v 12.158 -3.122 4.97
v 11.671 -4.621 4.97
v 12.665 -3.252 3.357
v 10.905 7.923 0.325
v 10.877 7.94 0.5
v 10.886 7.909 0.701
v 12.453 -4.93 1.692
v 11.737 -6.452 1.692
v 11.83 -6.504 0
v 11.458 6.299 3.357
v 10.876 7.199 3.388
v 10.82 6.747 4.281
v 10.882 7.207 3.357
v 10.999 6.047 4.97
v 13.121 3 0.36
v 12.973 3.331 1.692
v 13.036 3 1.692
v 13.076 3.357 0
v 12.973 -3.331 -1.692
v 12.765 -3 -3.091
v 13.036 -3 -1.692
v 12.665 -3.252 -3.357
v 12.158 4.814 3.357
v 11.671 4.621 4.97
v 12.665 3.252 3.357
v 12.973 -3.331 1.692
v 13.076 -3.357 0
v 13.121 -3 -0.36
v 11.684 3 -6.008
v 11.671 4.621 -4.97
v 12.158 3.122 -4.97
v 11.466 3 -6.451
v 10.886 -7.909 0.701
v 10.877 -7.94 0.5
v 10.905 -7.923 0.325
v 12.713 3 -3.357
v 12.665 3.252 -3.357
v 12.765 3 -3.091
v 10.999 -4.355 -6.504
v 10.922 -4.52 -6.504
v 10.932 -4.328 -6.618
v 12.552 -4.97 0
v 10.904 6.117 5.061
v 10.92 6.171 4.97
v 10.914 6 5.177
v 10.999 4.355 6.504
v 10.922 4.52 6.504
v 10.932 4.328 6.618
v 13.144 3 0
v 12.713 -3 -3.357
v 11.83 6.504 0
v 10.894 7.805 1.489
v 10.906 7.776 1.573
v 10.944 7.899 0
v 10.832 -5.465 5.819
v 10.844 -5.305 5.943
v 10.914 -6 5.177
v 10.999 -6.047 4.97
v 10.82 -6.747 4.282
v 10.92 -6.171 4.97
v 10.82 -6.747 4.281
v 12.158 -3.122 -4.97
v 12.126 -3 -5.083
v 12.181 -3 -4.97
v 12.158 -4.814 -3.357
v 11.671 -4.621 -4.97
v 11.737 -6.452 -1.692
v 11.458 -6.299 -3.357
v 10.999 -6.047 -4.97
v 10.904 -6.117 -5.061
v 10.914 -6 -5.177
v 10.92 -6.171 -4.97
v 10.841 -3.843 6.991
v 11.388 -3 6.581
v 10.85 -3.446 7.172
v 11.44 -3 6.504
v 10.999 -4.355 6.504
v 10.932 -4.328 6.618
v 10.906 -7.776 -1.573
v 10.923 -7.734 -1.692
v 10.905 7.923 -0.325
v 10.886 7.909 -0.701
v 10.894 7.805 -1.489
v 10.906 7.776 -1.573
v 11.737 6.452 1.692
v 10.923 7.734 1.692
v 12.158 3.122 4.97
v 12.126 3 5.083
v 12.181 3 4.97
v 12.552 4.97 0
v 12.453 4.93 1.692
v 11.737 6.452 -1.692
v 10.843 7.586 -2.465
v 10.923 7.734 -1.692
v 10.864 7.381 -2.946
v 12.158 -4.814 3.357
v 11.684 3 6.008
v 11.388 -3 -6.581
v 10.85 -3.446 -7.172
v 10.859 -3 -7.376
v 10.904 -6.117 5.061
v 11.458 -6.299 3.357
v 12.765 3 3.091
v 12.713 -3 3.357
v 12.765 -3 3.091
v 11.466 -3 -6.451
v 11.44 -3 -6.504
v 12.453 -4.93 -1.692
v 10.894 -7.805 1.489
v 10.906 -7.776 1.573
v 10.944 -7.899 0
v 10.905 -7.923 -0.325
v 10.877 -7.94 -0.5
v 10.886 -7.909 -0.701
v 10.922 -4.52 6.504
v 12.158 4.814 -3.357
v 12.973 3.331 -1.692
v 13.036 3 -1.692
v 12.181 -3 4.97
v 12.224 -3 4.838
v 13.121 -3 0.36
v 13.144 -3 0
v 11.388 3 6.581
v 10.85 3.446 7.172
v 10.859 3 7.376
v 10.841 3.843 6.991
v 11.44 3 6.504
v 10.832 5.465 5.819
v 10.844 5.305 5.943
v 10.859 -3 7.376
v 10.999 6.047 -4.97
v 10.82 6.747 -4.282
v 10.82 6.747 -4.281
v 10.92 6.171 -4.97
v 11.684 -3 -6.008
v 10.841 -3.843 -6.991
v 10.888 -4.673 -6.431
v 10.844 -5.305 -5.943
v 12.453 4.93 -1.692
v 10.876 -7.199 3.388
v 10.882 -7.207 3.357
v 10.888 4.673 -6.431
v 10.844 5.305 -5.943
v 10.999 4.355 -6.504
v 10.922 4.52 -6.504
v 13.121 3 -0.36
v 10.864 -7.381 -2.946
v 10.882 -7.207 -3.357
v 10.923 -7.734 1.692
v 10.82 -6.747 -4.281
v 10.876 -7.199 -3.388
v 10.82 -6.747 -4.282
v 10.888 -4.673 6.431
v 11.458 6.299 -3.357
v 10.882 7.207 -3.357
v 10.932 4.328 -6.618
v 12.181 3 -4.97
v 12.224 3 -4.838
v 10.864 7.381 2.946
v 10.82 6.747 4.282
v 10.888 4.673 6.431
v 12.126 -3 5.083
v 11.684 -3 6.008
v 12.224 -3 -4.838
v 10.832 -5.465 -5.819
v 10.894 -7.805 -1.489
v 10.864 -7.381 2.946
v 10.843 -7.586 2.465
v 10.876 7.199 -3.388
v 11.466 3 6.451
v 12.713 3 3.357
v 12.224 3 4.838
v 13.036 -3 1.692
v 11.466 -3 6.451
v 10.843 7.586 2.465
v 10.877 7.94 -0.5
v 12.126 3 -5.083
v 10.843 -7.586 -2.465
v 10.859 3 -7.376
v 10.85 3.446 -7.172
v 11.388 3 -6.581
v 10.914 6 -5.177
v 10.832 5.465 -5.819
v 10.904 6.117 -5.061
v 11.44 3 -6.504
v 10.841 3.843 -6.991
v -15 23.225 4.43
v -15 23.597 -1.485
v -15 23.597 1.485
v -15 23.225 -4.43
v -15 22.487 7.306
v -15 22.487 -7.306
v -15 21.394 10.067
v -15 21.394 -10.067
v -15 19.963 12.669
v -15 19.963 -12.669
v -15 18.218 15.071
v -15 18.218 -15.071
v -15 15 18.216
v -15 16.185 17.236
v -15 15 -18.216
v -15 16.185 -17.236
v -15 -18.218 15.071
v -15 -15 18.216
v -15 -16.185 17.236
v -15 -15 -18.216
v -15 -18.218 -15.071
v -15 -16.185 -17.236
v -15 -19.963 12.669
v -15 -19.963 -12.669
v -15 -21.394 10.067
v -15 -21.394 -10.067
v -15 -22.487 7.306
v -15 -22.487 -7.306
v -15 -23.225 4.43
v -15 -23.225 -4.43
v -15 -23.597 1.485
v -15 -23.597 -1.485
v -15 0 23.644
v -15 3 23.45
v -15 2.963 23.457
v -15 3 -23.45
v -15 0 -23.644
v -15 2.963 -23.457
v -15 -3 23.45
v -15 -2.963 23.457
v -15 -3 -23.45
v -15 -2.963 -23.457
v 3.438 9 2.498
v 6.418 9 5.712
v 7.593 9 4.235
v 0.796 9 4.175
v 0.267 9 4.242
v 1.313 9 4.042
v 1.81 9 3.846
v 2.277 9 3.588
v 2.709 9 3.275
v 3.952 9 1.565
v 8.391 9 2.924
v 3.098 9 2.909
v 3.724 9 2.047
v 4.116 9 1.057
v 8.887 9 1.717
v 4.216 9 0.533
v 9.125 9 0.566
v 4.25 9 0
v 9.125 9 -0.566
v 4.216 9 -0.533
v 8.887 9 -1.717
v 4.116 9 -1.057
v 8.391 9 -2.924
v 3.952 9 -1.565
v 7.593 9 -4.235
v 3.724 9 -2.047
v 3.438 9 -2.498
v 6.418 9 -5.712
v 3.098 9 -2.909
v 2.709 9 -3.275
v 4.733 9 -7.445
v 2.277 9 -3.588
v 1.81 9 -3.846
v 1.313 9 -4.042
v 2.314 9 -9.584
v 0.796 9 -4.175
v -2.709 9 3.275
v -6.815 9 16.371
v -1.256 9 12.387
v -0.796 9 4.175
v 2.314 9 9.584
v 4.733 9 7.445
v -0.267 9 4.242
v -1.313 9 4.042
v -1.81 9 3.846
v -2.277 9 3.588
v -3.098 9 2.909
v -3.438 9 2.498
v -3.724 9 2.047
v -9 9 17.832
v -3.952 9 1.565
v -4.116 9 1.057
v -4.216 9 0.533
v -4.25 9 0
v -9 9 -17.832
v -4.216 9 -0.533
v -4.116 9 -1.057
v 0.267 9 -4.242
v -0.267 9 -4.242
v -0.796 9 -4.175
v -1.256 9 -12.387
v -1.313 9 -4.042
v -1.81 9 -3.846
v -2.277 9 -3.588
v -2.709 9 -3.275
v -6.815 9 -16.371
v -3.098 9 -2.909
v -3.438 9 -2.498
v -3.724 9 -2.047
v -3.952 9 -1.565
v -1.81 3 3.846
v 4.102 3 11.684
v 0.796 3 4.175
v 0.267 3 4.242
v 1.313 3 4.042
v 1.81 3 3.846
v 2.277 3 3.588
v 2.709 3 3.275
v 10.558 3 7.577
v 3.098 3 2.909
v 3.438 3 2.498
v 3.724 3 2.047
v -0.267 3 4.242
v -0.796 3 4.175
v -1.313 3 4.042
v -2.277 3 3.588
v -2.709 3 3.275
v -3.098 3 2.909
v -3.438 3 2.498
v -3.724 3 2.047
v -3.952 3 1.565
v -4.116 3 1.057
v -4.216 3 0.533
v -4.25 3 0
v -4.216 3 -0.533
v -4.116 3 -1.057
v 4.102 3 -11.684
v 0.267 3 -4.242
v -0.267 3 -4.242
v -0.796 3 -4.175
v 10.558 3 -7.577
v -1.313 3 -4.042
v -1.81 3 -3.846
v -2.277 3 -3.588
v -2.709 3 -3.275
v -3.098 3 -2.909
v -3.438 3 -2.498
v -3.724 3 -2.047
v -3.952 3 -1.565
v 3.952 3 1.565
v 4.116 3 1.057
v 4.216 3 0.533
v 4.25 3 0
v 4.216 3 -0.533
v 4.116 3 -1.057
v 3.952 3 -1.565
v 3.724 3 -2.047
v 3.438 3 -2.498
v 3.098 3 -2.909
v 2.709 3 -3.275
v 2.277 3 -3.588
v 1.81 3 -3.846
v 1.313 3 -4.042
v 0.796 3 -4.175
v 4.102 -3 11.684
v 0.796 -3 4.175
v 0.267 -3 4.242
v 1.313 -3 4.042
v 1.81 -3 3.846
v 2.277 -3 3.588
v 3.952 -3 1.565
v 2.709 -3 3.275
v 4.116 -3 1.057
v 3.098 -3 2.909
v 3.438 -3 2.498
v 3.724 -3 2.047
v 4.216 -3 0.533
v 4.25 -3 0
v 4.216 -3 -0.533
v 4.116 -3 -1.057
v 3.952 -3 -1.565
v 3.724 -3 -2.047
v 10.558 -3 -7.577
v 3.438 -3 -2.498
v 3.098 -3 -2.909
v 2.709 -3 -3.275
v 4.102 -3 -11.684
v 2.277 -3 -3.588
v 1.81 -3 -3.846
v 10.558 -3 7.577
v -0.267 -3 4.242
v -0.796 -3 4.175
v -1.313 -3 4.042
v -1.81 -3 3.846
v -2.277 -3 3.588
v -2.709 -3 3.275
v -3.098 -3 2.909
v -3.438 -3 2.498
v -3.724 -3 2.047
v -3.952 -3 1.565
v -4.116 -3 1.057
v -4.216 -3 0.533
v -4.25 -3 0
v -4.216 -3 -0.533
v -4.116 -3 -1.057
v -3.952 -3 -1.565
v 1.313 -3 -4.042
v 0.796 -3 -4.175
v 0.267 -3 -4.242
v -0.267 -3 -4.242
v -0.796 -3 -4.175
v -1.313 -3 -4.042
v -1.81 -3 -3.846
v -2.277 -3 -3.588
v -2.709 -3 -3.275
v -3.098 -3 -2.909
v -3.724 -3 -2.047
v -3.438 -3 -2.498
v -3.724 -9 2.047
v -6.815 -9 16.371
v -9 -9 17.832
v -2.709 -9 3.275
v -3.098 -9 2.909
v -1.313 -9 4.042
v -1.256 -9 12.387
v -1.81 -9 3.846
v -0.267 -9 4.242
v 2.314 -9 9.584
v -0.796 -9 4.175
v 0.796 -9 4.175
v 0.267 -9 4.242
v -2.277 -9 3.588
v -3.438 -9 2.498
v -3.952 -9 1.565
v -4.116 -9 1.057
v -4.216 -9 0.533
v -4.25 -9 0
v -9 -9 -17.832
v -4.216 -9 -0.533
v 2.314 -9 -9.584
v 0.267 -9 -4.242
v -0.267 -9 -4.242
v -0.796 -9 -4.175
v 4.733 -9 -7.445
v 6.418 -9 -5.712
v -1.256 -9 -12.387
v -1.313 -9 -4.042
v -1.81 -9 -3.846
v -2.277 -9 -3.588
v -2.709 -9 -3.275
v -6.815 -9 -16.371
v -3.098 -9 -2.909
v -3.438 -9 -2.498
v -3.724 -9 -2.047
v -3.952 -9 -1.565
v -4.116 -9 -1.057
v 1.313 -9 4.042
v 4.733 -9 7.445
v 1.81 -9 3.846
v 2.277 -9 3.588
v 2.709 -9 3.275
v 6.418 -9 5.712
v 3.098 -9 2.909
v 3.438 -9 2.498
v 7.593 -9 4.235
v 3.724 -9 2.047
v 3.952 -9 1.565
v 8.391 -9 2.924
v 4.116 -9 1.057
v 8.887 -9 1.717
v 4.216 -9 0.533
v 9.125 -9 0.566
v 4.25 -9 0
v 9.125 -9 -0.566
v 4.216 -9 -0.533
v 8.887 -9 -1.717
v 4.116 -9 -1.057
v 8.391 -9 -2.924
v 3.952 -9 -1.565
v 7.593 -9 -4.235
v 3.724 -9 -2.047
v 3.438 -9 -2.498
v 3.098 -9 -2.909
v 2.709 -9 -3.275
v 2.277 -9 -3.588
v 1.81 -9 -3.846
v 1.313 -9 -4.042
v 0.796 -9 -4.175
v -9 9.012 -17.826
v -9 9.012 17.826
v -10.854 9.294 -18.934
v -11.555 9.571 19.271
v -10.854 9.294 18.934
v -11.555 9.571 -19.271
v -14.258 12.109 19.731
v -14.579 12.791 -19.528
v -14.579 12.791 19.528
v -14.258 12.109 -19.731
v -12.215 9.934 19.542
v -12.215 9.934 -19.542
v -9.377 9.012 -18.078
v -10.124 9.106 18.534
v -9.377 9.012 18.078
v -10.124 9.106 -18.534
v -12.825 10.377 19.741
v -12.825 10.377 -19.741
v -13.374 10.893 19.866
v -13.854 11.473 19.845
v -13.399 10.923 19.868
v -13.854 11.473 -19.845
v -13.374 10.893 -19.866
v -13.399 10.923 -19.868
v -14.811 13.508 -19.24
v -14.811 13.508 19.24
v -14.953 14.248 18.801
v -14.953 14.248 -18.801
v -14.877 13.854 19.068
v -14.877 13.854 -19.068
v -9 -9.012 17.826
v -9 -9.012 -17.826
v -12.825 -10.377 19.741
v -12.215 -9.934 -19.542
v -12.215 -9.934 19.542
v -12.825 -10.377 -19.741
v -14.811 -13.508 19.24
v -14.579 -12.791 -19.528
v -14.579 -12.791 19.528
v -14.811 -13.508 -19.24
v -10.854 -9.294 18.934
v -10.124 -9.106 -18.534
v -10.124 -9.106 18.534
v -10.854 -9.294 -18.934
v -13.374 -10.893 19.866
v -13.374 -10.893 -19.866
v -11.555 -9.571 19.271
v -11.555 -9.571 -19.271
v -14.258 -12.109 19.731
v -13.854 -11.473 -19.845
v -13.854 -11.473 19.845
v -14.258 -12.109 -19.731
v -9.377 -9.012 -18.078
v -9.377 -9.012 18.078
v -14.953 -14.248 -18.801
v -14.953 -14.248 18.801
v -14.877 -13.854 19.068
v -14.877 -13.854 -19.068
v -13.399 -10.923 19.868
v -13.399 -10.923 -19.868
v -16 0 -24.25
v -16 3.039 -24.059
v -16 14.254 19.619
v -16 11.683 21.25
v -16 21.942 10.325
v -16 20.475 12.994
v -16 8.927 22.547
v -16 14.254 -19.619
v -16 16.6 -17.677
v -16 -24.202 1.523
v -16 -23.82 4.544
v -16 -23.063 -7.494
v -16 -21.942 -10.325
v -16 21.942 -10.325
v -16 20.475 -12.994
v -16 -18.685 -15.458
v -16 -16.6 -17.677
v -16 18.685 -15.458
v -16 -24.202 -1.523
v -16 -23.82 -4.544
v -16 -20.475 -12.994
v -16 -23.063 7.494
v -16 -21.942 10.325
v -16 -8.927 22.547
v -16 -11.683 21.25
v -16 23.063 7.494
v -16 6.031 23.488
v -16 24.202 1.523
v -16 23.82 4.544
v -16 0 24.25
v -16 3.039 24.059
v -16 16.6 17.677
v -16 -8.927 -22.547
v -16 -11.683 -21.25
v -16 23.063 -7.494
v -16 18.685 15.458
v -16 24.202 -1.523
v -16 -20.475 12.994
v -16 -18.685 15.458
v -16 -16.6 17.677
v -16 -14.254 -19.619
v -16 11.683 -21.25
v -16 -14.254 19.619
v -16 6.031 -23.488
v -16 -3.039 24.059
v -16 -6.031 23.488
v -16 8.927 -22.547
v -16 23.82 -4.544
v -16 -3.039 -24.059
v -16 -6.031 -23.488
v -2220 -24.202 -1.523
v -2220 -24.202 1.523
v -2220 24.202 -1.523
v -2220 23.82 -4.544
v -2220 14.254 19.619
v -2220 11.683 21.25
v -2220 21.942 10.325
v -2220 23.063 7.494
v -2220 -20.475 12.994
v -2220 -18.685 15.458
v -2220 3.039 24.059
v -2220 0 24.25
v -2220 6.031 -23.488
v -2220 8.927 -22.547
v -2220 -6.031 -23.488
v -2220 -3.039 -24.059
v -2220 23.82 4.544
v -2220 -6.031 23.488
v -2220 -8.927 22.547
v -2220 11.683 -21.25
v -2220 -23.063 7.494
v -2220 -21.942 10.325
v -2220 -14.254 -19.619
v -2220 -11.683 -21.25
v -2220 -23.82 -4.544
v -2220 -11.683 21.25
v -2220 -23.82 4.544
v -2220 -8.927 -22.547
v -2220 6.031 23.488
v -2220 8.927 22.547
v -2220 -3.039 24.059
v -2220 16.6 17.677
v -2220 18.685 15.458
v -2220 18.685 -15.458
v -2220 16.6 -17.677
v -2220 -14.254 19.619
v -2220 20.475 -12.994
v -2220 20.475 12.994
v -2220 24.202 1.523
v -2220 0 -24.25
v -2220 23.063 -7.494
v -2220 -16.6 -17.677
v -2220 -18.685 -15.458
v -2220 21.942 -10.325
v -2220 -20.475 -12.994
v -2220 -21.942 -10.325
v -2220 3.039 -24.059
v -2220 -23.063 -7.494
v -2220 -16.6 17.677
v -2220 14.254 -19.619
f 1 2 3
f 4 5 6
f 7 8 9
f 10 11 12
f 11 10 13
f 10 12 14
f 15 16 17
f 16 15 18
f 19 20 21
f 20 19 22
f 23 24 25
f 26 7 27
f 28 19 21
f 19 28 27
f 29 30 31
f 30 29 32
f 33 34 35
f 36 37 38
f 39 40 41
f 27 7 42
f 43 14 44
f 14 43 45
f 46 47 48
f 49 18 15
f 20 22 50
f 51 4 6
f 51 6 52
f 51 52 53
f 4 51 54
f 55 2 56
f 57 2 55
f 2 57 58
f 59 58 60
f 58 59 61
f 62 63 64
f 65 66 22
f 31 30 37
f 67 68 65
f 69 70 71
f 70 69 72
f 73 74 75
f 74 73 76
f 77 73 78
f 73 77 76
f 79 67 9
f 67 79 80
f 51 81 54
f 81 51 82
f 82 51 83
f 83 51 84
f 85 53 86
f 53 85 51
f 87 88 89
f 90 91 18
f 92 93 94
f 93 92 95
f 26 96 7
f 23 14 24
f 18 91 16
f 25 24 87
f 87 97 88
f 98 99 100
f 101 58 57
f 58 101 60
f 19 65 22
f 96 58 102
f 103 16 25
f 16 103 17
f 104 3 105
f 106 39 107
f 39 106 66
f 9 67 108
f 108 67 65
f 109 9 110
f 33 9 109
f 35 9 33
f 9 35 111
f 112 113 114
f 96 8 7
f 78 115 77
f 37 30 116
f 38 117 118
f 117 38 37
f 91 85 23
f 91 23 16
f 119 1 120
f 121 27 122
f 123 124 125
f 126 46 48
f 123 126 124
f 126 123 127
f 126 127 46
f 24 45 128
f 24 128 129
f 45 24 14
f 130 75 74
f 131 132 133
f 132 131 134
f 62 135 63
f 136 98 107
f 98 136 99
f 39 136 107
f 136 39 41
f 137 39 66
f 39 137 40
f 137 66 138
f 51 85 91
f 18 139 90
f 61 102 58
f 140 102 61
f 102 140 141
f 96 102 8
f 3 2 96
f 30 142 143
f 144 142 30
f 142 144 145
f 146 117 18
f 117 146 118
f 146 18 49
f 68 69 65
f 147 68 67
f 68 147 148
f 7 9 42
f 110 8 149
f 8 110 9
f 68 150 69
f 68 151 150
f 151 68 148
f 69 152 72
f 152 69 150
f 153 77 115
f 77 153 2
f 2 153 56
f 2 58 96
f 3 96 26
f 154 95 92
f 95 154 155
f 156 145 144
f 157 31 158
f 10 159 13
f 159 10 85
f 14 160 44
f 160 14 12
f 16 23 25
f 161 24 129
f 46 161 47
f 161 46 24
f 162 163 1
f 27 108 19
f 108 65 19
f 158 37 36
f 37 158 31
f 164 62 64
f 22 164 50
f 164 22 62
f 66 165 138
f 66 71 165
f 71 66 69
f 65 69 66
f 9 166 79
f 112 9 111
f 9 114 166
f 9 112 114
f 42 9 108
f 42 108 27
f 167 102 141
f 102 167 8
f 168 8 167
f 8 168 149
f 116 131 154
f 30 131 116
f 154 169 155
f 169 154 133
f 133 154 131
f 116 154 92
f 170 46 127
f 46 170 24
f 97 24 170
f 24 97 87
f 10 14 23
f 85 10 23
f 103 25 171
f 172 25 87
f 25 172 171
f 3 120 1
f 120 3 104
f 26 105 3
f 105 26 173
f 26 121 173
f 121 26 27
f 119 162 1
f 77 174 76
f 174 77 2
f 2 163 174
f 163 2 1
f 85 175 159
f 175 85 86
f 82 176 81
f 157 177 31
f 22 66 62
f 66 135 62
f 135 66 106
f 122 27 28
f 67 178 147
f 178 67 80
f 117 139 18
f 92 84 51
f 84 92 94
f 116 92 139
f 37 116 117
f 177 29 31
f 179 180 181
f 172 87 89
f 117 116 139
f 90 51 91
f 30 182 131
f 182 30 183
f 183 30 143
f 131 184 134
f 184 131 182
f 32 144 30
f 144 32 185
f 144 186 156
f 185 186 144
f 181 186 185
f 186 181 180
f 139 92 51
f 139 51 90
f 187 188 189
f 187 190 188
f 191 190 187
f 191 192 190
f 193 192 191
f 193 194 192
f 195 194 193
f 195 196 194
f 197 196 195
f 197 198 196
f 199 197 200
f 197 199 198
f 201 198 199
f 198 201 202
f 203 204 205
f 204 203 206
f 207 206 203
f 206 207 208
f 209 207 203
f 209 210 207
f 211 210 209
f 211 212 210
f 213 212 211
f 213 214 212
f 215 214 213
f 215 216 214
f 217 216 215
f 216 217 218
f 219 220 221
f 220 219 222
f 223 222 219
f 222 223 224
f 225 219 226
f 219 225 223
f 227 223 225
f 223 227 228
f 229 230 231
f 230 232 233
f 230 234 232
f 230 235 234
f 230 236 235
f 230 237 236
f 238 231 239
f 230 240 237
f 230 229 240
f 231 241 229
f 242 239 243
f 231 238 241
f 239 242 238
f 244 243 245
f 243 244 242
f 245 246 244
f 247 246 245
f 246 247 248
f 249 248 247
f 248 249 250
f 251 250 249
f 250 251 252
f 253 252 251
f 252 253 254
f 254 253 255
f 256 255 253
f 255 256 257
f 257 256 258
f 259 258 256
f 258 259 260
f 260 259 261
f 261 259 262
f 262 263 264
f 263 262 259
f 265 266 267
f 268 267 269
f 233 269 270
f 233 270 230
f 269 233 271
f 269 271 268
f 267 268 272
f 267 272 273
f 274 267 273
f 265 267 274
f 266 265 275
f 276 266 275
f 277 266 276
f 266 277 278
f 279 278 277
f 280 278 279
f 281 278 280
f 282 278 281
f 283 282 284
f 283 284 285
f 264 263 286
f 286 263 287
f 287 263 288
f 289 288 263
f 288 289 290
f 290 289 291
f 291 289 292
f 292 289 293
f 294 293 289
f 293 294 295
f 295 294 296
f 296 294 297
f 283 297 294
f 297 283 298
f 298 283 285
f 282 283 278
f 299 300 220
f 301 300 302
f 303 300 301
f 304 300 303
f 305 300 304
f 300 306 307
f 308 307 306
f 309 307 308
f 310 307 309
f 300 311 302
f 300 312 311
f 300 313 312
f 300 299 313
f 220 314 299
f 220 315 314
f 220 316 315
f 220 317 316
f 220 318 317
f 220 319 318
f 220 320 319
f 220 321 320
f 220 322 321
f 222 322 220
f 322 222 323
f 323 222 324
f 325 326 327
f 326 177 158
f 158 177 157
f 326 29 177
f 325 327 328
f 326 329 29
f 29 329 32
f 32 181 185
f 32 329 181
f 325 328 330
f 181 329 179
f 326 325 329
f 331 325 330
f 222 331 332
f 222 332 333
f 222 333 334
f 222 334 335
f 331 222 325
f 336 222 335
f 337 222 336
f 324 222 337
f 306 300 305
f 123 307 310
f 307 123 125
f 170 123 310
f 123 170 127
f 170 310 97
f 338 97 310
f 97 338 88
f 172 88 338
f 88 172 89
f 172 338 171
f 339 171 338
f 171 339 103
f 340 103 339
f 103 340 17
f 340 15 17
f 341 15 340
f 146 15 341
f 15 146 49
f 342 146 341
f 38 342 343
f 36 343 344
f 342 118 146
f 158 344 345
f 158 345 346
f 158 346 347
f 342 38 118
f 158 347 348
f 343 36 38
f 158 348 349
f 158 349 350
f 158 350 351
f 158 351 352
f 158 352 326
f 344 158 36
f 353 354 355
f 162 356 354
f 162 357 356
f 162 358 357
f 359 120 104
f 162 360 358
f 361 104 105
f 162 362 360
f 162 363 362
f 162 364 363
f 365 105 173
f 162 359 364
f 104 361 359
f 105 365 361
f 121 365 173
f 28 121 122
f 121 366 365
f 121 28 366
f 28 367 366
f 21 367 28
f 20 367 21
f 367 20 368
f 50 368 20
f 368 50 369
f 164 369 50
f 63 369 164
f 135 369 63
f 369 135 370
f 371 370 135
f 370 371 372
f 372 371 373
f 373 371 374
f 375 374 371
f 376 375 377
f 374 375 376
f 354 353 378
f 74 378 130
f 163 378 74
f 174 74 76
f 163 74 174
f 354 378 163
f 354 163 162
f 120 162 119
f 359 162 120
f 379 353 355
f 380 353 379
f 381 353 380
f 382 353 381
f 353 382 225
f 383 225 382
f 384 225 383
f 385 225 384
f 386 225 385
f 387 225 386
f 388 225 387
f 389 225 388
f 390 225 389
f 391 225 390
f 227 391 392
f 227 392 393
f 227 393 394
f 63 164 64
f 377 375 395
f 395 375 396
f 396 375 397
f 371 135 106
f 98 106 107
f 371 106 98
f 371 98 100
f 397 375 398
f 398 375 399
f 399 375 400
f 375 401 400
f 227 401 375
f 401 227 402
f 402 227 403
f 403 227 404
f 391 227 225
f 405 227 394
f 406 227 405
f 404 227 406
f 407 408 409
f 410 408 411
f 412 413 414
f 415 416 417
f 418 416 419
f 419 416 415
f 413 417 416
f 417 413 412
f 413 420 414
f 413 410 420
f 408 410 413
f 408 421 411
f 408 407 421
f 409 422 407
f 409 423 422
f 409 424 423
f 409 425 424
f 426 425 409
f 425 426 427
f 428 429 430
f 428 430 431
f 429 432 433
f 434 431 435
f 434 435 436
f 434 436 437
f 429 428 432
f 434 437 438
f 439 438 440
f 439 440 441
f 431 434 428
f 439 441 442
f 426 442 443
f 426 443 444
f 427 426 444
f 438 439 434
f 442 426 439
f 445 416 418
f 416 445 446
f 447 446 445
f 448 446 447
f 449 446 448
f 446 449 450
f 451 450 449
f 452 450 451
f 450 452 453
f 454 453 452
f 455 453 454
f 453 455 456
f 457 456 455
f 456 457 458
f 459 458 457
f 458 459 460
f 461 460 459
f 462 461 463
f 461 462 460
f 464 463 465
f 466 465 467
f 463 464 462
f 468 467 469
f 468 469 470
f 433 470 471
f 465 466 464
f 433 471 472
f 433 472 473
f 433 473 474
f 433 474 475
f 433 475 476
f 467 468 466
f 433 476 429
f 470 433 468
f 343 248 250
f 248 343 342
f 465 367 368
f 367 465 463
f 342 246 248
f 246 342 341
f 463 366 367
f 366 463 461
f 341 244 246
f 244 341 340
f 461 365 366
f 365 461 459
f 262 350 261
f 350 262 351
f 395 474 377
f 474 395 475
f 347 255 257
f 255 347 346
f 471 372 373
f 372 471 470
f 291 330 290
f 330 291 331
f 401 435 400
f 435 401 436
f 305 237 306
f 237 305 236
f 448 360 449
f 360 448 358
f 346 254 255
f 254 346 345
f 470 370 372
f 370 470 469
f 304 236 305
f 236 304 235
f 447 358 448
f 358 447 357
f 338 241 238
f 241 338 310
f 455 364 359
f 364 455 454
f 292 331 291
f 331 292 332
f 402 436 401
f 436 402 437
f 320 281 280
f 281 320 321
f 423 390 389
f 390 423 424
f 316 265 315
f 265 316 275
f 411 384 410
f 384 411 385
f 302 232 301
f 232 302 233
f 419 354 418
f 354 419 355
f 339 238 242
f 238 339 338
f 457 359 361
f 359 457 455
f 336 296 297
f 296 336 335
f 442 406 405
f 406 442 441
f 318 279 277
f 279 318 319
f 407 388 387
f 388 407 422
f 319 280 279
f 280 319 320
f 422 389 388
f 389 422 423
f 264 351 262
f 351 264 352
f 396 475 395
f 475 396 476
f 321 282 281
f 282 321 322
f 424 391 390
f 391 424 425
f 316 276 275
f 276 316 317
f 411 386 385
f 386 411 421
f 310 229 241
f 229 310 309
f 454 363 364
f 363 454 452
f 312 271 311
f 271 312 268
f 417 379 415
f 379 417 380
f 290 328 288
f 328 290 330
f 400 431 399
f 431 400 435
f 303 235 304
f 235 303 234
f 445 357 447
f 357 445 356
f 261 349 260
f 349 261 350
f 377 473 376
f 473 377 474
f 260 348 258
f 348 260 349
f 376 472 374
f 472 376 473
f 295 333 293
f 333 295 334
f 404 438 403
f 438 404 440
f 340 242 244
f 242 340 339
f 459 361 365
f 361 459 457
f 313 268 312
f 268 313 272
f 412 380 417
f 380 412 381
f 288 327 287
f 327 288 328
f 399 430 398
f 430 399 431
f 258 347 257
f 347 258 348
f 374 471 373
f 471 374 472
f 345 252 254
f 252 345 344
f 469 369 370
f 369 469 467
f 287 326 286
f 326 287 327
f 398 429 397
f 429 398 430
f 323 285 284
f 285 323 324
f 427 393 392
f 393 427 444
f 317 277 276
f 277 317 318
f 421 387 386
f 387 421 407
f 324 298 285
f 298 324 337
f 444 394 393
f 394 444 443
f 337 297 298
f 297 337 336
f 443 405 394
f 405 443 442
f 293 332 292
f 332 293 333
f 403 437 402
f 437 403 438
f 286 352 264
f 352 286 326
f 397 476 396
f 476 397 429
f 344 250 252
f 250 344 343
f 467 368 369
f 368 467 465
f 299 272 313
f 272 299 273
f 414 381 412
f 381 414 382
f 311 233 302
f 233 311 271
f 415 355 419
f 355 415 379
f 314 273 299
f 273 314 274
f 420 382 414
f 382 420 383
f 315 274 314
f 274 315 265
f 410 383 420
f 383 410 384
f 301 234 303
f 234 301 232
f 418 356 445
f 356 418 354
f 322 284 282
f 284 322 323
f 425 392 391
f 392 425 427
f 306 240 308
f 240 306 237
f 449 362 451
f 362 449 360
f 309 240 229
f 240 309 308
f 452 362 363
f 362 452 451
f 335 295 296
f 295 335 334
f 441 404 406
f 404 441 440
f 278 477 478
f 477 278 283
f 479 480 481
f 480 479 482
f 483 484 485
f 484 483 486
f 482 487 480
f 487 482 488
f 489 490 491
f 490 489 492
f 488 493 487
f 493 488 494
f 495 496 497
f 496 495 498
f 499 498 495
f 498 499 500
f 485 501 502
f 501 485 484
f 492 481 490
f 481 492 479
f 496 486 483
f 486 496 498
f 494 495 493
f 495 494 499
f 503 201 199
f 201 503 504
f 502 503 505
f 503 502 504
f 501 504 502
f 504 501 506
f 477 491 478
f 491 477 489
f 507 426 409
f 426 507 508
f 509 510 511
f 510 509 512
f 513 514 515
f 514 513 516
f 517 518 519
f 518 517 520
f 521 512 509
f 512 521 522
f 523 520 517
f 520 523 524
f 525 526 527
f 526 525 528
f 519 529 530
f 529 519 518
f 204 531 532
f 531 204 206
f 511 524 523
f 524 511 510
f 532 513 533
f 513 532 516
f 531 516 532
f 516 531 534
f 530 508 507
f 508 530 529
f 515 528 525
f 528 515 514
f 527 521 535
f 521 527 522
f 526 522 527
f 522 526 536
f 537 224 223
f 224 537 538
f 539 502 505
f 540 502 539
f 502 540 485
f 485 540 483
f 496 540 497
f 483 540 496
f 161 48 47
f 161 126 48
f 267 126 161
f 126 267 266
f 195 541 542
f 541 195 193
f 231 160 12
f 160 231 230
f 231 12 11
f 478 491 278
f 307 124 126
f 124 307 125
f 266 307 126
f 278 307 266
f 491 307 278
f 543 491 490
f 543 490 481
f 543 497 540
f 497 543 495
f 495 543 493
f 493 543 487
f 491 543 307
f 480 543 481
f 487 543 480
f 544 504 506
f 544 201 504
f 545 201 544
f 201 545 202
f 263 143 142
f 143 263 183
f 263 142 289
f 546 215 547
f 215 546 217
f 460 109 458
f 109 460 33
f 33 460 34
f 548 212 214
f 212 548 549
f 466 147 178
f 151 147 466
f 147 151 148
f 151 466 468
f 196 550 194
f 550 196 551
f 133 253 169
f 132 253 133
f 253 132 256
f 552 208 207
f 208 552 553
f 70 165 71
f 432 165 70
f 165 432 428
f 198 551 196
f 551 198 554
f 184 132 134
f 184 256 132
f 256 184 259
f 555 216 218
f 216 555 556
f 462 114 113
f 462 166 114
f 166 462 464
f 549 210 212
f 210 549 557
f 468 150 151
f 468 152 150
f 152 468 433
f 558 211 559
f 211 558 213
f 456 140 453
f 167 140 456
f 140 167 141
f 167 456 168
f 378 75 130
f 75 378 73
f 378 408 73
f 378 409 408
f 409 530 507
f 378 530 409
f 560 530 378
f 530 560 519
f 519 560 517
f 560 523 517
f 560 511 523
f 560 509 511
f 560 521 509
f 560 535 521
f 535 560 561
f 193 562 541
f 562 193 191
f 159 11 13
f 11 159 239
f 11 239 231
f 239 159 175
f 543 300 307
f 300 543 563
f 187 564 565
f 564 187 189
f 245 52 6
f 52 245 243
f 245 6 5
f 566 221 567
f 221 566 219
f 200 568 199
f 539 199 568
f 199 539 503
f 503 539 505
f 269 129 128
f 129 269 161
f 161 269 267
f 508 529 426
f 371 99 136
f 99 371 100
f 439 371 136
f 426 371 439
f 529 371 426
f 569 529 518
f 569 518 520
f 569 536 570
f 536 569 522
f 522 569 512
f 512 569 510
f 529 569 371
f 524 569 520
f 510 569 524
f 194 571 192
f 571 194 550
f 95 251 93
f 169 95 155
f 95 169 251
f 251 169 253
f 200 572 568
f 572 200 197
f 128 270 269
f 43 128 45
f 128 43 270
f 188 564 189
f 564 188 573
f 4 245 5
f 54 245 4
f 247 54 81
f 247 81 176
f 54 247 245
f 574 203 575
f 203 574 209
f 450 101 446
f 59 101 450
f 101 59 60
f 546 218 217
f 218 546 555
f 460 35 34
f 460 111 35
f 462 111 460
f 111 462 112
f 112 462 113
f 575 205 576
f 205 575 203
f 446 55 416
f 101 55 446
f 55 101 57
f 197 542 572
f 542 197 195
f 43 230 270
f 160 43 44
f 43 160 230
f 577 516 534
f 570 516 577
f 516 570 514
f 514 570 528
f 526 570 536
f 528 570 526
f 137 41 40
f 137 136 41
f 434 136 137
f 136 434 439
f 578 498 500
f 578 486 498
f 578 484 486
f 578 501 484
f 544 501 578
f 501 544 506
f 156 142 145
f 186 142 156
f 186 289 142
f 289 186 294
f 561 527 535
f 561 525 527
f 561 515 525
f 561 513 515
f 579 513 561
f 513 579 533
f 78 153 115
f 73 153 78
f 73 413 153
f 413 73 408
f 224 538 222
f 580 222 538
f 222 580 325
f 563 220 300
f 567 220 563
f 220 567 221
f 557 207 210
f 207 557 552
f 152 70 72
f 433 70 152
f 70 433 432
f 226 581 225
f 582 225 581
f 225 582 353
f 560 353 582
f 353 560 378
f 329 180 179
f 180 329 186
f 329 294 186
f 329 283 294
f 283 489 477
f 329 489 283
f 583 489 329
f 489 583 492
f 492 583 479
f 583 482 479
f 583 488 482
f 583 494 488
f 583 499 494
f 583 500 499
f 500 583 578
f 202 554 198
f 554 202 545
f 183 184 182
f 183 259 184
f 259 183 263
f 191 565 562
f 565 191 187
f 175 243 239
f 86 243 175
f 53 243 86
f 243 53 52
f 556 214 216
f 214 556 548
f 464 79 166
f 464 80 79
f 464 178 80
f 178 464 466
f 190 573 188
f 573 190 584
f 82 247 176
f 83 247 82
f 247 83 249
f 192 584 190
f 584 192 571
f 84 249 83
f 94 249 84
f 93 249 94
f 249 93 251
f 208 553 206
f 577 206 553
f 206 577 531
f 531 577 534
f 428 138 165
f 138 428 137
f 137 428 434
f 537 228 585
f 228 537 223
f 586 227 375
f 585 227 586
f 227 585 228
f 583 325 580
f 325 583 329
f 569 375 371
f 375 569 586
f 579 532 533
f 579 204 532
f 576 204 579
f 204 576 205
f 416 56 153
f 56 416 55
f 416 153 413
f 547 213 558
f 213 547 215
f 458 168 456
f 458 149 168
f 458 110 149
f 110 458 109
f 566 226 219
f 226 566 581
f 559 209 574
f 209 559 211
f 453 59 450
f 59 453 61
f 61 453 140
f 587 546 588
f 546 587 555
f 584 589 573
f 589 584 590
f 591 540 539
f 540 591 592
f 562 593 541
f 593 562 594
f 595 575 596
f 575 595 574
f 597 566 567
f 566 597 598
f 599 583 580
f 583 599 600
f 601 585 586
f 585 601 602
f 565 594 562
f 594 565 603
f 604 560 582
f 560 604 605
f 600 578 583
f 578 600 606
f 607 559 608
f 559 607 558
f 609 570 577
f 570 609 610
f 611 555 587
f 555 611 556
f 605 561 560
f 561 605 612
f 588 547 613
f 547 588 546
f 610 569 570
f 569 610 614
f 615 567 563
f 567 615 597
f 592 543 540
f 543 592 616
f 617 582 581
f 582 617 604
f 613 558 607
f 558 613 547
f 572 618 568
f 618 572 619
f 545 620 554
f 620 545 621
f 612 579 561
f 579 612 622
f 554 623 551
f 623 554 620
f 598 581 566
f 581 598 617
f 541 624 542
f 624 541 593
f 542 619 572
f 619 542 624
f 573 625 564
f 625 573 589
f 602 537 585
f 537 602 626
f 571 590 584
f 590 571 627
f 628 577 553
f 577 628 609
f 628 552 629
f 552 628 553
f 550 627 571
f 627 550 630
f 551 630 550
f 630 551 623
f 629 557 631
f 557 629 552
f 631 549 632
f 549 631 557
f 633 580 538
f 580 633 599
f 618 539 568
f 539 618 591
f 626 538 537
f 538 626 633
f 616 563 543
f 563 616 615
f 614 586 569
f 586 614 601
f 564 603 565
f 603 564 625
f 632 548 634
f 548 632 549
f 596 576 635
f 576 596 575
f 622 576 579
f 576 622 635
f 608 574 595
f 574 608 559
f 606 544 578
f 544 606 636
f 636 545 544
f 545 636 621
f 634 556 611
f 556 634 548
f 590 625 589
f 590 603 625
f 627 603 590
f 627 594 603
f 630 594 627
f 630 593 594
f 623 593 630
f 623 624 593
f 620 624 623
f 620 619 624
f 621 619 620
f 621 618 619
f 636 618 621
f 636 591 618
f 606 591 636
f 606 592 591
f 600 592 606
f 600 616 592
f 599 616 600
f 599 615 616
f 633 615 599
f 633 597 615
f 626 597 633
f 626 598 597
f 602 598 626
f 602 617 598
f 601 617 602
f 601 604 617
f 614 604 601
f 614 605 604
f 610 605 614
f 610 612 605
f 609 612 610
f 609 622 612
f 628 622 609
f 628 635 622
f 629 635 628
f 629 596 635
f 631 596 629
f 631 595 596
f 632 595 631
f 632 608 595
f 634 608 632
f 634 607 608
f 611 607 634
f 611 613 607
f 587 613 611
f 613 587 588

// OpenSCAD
// file: ../Parts/ShplRoz.scad
ShplRoz();

    gikLen = 2200;
    diamVnesh = 48.5;
    platformThickns = 5;
    ushiThickns = 6;
    lenA = 40;
    shplintDia = 8.5;
    shplintHoleHeight = 15;

module ShplRoz() {

    intersection() {
        
        union() {
            
            //Цилиндр
            translate([+platformThickns-1,0,0]) 
            rotate([0,-90,0]) 
            cylinder(h=shplintHoleHeight+platformThickns, d=diamVnesh);   // Эта часть такая, какая нужна.    

            // Сфера
            sphere(d = ushiThickns*4.5);
       } 

       ConicBar();

    }

    //Цилиндр затычки, высотой 4мм 
    translate([-shplintHoleHeight-1,0,0]) 
    rotate([0,-90,0]) 
    cylinder(h=platformThickns-1, d=diamVnesh);    

}




module ConicBar() {
    
    intersection() { 

        union() {
                                        
            // Шайба 1мм
            translate([-shplintHoleHeight,0,0]) 
            rotate([0,-90,0]) 
            cylinder(h=1, d=diamVnesh);
    
            // Захваты упора с дырками.
            difference(){ 
                    
                // Захваты упора.
                union() {  
                    translate([-shplintHoleHeight,ushiThickns /2 ,-diamVnesh/2]) 
                    cube([lenA,ushiThickns ,diamVnesh]);    

                    translate([-shplintHoleHeight,-3*ushiThickns /2 ,-diamVnesh/2]) 
                    cube([lenA,ushiThickns ,diamVnesh]);
                        
                }
                    
                // Дырки для шплинта ( вырез цилиндра )
                translate([0 ,-1-ushiThickns*3/2,0]) 
                rotate([-90,0,0]) 
                cylinder(h=ushiThickns *3+2, d=shplintDia); 

            }
        
            // Стыки
            difference() {

                translate([-shplintHoleHeight,3*ushiThickns /2 ,-diamVnesh/2]) 
                cube([ushiThickns,ushiThickns ,diamVnesh]);    

                translate([-shplintHoleHeight + ushiThickns,5*ushiThickns/2,-diamVnesh/2]) 
                rotate([0,0,0]) 
                cylinder(h=diamVnesh, d=ushiThickns*2  );       
            }
            difference() {

                translate([-shplintHoleHeight,-5*ushiThickns /2 ,-diamVnesh/2]) 
                cube([ushiThickns,ushiThickns ,diamVnesh]);      

                translate([-shplintHoleHeight + ushiThickns,-5*ushiThickns/2,-diamVnesh/2]) 
                rotate([0,0,0]) 
                cylinder(h=diamVnesh, d=ushiThickns*2  );       
            }   
        
        }

        // Конус. Нужно оставить то, что в нём.
        translate([-shplintHoleHeight-1,0,0]) 
        rotate([0,90,0]) 
        cylinder(h=platformThickns*8, d1=diamVnesh, d2=0);   // Пересекаем с этим конусом.
   
    } // Пересечение
}   // Модуль ConicBar
// main file
use <../Parts/ShplRoz.scad>;

Boom();

    gikLen = 2200;
    diamVnesh = 48.5;
    platformThickns = 5;
    ushiThickns = 6;
    lenA = 40;
    shplintDia = 8.5;
    shplintHoleHeight = 15;


module Boom() {
    
    $fn = 50;
    
    px = - platformThickns  - shplintHoleHeight;
    translate([px,0,0]) rotate([0,-90,0]) cylinder(h=gikLen, d=diamVnesh);        // сам гик
    ShplRoz();
}
